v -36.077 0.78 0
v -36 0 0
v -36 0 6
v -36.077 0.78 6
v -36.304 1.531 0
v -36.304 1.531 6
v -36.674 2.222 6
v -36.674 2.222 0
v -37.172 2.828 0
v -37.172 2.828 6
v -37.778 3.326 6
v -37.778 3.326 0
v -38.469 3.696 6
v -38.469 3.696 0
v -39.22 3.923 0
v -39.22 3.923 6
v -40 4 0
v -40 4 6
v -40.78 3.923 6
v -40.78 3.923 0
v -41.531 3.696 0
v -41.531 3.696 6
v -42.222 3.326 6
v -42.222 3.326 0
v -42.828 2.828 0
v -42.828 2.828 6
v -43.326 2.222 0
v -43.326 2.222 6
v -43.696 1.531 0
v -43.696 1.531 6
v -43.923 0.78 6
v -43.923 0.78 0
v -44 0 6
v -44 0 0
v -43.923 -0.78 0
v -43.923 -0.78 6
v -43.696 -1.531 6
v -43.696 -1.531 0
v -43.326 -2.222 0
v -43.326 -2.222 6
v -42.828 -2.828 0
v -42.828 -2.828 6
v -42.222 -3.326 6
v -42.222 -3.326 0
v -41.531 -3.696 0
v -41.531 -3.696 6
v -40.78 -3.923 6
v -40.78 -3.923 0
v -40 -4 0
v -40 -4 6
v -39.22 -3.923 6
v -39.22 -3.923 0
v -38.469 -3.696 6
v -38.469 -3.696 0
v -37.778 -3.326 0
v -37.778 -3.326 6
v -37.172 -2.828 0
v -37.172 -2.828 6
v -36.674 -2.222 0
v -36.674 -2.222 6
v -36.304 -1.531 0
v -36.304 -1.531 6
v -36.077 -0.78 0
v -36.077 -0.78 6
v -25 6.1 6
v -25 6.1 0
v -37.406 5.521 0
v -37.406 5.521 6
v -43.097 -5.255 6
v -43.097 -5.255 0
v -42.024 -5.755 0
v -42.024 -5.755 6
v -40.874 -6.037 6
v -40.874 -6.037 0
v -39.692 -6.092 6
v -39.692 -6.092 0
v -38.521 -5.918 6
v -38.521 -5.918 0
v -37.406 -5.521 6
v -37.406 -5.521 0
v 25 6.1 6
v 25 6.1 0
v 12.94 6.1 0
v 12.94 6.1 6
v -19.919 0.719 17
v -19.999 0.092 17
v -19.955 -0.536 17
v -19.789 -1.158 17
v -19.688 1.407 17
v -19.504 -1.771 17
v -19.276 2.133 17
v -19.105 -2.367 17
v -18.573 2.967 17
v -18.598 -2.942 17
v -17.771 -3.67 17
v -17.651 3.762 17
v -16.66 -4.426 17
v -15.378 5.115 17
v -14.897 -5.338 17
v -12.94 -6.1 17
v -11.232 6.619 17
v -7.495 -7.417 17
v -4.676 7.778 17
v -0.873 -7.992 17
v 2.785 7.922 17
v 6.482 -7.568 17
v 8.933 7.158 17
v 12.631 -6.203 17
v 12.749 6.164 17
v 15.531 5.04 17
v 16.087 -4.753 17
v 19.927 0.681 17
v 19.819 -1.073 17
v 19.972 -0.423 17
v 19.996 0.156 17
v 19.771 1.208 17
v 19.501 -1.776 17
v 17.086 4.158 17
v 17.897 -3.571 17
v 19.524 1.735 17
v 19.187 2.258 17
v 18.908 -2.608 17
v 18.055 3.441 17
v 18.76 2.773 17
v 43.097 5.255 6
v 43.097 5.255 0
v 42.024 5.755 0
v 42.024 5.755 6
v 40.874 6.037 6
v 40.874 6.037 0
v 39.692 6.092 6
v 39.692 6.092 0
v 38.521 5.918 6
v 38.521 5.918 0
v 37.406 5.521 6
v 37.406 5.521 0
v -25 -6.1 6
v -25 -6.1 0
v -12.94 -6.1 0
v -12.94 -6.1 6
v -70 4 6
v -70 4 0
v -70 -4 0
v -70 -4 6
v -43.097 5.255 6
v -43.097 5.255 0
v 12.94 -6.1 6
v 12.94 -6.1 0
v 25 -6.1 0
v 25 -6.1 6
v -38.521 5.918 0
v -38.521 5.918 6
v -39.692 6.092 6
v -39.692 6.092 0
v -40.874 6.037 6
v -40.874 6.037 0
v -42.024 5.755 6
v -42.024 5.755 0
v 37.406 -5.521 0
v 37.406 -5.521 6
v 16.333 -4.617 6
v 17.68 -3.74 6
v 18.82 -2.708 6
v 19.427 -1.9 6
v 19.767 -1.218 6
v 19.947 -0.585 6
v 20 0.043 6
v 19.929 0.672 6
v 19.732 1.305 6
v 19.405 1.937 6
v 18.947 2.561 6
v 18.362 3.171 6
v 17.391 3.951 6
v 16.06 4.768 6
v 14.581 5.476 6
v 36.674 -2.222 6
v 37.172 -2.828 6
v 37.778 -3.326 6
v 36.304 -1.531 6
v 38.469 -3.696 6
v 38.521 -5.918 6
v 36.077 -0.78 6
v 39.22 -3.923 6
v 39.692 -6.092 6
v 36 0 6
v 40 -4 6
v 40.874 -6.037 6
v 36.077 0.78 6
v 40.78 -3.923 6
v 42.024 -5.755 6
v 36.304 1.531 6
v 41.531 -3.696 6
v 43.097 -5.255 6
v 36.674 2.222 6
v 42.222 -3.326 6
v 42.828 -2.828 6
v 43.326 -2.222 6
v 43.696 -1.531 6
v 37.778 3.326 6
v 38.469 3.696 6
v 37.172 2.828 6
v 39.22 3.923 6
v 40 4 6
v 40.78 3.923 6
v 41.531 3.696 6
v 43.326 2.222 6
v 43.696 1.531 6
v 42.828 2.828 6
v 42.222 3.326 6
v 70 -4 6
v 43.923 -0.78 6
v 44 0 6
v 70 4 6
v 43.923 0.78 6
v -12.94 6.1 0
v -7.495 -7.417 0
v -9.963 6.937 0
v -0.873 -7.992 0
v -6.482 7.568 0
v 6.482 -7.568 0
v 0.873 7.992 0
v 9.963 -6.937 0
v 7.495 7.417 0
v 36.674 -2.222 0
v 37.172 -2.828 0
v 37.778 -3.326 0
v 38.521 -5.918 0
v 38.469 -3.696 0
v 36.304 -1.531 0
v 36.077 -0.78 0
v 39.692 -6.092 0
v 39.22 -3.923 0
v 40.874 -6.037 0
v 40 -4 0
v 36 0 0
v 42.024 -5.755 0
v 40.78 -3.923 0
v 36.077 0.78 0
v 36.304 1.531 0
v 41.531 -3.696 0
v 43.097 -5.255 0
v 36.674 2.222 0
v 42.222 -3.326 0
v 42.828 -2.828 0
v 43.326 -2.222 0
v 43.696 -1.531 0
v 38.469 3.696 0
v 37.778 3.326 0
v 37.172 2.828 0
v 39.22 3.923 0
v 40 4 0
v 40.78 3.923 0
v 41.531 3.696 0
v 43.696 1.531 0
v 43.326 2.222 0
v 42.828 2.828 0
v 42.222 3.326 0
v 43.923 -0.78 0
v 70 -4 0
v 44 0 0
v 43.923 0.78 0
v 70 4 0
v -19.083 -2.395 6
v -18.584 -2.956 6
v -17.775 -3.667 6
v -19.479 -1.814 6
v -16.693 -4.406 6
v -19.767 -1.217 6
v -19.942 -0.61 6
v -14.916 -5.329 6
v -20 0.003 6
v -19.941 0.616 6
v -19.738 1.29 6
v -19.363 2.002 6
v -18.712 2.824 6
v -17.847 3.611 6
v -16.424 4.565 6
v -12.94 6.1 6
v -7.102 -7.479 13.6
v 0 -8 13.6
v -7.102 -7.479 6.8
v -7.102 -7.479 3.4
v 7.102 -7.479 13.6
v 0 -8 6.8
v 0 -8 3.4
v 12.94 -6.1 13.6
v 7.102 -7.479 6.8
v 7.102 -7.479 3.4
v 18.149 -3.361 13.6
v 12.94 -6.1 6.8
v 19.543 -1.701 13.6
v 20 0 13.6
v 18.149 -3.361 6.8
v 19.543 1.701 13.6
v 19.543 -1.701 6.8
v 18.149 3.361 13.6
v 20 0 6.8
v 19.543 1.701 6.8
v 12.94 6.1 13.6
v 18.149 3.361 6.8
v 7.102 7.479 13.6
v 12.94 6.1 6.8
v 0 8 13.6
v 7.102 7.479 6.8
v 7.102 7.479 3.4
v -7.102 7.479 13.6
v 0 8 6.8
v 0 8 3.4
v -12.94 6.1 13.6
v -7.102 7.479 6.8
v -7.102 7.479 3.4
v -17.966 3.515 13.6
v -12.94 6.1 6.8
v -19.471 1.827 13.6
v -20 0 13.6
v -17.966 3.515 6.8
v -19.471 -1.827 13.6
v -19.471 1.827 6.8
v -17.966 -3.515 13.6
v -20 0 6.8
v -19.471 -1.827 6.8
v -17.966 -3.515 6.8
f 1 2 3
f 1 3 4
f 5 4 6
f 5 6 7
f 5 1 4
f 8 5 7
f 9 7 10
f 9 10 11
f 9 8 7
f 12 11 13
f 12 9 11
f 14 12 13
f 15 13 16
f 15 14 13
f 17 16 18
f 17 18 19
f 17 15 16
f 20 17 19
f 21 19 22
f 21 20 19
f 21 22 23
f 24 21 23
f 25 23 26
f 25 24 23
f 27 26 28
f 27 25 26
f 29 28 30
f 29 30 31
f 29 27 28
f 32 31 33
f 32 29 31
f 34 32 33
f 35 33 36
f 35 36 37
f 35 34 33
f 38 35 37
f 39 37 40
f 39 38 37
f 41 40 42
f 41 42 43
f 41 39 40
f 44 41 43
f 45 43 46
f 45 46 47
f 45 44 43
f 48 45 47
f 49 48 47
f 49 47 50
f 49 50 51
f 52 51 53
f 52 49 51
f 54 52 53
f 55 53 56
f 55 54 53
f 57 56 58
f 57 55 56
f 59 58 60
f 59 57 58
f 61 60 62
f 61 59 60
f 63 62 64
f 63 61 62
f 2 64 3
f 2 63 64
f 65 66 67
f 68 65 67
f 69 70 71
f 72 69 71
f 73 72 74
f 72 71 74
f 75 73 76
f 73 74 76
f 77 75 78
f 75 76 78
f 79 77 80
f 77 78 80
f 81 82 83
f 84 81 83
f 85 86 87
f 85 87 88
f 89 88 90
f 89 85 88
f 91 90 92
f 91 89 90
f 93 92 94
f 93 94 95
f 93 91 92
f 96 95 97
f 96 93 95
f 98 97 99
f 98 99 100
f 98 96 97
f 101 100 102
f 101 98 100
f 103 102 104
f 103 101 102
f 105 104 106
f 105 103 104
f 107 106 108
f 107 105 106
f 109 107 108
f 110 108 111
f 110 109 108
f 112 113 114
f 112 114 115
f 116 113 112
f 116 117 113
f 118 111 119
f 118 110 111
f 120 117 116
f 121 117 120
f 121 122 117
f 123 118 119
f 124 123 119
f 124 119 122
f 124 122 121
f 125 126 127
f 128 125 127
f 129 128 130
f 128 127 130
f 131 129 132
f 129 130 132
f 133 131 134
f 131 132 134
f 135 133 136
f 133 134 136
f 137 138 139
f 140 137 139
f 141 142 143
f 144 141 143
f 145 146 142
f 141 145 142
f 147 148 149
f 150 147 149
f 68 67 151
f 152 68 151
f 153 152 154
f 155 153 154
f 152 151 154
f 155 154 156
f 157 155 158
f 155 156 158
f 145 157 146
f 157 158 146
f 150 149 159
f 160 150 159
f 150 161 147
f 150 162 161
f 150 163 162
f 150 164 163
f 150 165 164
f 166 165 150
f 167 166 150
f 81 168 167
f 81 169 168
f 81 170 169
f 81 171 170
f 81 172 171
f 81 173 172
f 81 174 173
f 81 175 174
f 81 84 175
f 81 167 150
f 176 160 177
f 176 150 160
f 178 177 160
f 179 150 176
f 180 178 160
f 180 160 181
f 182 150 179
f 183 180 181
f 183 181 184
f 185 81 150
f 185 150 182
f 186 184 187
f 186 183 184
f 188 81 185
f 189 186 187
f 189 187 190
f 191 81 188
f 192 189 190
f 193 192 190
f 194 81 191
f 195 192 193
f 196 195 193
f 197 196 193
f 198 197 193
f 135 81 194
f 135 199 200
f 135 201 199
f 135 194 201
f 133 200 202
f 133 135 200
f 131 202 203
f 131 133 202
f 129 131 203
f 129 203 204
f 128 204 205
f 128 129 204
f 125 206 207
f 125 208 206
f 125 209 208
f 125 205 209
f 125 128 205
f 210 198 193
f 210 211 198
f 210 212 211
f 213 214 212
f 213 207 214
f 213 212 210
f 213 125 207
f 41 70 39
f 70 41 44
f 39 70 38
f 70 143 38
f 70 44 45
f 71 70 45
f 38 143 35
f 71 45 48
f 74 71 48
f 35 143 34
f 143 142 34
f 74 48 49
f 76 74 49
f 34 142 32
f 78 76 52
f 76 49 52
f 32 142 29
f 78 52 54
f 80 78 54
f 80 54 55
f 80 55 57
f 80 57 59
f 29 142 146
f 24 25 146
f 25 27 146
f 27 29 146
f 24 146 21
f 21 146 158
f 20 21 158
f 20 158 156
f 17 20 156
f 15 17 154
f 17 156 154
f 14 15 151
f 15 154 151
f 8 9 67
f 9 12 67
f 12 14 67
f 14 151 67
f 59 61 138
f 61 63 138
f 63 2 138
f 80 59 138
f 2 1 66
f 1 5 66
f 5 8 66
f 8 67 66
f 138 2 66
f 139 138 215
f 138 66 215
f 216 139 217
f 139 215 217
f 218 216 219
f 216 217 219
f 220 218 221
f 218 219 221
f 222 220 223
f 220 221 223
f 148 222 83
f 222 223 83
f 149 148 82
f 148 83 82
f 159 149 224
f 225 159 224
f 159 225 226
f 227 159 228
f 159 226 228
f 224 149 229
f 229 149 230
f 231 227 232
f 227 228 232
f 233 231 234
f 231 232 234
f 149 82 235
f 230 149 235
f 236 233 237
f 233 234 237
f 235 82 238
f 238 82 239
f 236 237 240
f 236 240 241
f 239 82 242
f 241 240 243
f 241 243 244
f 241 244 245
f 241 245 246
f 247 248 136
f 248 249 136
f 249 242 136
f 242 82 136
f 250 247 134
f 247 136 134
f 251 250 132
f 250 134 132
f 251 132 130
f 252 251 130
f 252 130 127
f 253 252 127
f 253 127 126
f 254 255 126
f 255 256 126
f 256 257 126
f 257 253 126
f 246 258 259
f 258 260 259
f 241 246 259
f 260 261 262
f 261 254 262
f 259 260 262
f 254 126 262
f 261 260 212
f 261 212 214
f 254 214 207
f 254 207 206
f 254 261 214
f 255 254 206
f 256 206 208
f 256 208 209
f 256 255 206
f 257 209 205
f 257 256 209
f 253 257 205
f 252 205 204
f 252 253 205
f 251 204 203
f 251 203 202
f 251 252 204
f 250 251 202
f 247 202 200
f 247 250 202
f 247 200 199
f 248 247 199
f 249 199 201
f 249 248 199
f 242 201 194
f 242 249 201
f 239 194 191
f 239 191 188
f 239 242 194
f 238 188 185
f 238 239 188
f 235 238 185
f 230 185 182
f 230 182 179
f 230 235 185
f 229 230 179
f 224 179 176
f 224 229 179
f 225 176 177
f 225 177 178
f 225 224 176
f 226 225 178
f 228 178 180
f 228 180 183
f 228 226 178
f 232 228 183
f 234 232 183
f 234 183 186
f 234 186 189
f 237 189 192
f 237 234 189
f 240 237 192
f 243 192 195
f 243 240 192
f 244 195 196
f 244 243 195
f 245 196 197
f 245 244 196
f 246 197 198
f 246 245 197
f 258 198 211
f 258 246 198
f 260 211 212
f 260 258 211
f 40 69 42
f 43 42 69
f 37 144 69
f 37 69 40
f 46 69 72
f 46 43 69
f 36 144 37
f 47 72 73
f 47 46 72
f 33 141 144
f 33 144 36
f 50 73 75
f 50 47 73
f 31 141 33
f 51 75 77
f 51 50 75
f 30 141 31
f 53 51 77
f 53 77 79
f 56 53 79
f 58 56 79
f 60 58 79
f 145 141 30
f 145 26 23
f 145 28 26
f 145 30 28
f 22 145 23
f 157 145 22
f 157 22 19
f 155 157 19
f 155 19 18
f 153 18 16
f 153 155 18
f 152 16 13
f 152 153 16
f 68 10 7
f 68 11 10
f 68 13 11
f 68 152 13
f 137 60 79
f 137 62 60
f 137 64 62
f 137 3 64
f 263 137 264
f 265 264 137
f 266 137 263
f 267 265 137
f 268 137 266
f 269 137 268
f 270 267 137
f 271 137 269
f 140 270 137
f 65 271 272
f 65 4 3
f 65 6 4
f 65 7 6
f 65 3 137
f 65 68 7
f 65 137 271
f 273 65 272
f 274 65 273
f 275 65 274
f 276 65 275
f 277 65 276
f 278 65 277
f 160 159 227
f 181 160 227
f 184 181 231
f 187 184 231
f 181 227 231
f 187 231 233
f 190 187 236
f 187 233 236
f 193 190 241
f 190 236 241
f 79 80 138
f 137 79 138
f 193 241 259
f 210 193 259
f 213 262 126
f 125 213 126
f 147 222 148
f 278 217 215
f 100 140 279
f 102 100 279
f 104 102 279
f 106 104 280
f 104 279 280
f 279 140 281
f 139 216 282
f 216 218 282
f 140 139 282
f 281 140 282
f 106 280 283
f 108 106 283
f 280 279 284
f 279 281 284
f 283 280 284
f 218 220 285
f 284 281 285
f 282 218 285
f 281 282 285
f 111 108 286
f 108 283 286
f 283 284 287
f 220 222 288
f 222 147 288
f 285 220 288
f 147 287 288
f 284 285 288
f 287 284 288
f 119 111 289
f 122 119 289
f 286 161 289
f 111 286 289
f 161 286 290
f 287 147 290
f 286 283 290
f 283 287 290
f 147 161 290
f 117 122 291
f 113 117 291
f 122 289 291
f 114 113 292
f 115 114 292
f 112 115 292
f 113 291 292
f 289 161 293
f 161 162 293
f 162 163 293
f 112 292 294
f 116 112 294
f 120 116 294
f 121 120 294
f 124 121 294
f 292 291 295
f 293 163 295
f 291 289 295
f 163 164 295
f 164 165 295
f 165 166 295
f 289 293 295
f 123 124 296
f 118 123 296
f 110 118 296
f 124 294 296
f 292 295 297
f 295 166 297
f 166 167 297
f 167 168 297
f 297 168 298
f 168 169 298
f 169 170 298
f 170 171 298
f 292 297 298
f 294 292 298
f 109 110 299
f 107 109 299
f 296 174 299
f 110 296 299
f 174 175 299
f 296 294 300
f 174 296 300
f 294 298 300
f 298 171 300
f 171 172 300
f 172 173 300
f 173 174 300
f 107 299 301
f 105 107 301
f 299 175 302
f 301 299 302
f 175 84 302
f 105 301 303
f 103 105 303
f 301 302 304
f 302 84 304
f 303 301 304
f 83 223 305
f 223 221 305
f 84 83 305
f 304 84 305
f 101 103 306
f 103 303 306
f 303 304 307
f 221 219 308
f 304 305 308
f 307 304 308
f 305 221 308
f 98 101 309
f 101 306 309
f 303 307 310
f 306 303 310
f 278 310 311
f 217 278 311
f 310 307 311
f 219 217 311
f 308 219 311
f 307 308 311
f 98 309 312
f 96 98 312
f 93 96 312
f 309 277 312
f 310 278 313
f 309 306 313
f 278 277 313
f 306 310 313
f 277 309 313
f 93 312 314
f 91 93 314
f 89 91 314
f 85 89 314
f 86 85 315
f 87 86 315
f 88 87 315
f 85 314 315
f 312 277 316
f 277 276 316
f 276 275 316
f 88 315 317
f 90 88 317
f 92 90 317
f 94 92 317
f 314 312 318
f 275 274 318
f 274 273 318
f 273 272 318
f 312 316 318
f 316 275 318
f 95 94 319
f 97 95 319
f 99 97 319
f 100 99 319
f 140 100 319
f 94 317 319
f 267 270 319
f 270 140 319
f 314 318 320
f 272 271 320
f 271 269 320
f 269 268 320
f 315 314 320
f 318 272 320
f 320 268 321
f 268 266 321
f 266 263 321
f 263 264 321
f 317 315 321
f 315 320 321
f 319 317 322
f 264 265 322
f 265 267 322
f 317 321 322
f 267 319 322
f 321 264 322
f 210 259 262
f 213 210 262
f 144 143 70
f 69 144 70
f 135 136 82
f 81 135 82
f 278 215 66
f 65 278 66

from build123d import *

# Parameters (mm, degrees)
F0_R     = 4
F1_DEPTH = 6
F2_DEPTH = 17


with BuildPart() as f1:
    # F0 (on Top) → F1 (new body)
    with BuildSketch(Plane.XY):
        with BuildLine():
            ThreePointArc((-43.096752955, -5.2554848621), (-46.1, 0), (-43.096752955, 5.2554848621))
            Line((-43.096752955, 5.2554848621), (-70, 4))
            Line((-70, 4), (-70, 0))
            Line((-70, 0), (-70, -4))
            Line((-70, -4), (-43.096752955, -5.2554848621))
        make_face()
        with BuildLine():
            Line((-43.096752955, 5.2554848621), (-37.4061518301, 5.5210462479))
            ThreePointArc((-37.4061518301, 5.5210462479), (-40.2843572017, 6.0933686071), (-43.096752955, 5.2554848621))
        make_face()
        with BuildLine():
            ThreePointArc((-43.096752955, -5.2554848621), (-40.2843572017, -6.0933686071), (-37.4061518301, -5.5210462479))
            Line((-37.4061518301, -5.5210462479), (-43.096752955, -5.2554848621))
        make_face()
        with BuildLine():
            add(Edge.make_bspline(
                [(-12.9397642946, 6.1), (-30.9124641603, 0), (-12.9397642946, -6.1)],
                knots=[2.2744242295, 2.2744242295, 2.2744242295, 4.0087610776, 4.0087610776, 4.0087610776], degree=2, weights=[1, 0.6469882147, 1]))
            Line((-12.9397642946, 6.1), (-25, 6.1))
            Line((-25, 6.1), (-37.4061518301, 5.5210462479))
            ThreePointArc((-37.4061518301, 5.5210462479), (-34.8506081021, 3.2701319671), (-33.9, 0))
            ThreePointArc((-33.9, 0), (-34.8506081021, -3.2701319671), (-37.4061518301, -5.5210462479))
            Line((-37.4061518301, -5.5210462479), (-25, -6.1))
            Line((-25, -6.1), (-12.9397642946, -6.1))
        make_face()
        with BuildLine():
            ThreePointArc((-33.9, 0), (-34.8506081021, 3.2701319671), (-37.4061518301, 5.5210462479))
            Line((-37.4061518301, 5.5210462479), (-43.096752955, 5.2554848621))
            ThreePointArc((-43.096752955, 5.2554848621), (-46.1, 0), (-43.096752955, -5.2554848621))
            Line((-43.096752955, -5.2554848621), (-37.4061518301, -5.5210462479))
            ThreePointArc((-37.4061518301, -5.5210462479), (-34.8506081021, -3.2701319671), (-33.9, 0))
        make_face()
        with Locations((-40, 0)):
            Circle(F0_R, mode=Mode.SUBTRACT)
    extrude(amount=F1_DEPTH)



with BuildPart() as f1b:
    # F0 (on Top) → F1, piece 2 (new body)
    with BuildSketch(Plane.XY):
        with BuildLine():
            Line((70, 4), (43.096752955, 5.2554848621))
            ThreePointArc((43.096752955, 5.2554848621), (45.2962341822, 3.0265332457), (46.1, 0))
            ThreePointArc((46.1, 0), (45.2962341822, -3.0265332457), (43.096752955, -5.2554848621))
            Line((43.096752955, -5.2554848621), (70, -4))
            Line((70, -4), (70, 0))
            Line((70, 0), (70, 4))
        make_face()
        with BuildLine():
            Line((43.096752955, -5.2554848621), (37.4061518301, -5.5210462479))
            ThreePointArc((37.4061518301, -5.5210462479), (40.2843572017, -6.0933686071), (43.096752955, -5.2554848621))
        make_face()
        with BuildLine():
            ThreePointArc((43.096752955, 5.2554848621), (40.2843572017, 6.0933686071), (37.4061518301, 5.5210462479))
            Line((37.4061518301, 5.5210462479), (43.096752955, 5.2554848621))
        make_face()
        with BuildLine():
            add(Edge.make_bspline(
                [(20, 0), (20, 3.7037302061), (12.9397642946, 6.1)],
                knots=[0, 0, 0, 0.8671684241, 0.8671684241, 0.8671684241], degree=2, weights=[1, 0.907465761, 1]))
            add(Edge.make_bspline(
                [(12.9397642946, -6.1), (20, -3.7037302061), (20, 0)],
                knots=[5.4160168831, 5.4160168831, 5.4160168831, 6.2831853072, 6.2831853072, 6.2831853072], degree=2, weights=[1, 0.907465761, 1]))
            Line((12.9397642946, -6.1), (25, -6.1))
            Line((25, -6.1), (37.4061518301, -5.5210462479))
            ThreePointArc((37.4061518301, -5.5210462479), (33.9, 0), (37.4061518301, 5.5210462479))
            Line((37.4061518301, 5.5210462479), (25, 6.1))
            Line((25, 6.1), (12.9397642946, 6.1))
        make_face()
        with BuildLine():
            Line((43.096752955, 5.2554848621), (37.4061518301, 5.5210462479))
            ThreePointArc((37.4061518301, 5.5210462479), (33.9, 0), (37.4061518301, -5.5210462479))
            Line((37.4061518301, -5.5210462479), (43.096752955, -5.2554848621))
            ThreePointArc((43.096752955, -5.2554848621), (45.2962341822, -3.0265332457), (46.1, 0))
            ThreePointArc((46.1, 0), (45.2962341822, 3.0265332457), (43.096752955, 5.2554848621))
        make_face()
        with Locations((40, 0)):
            Circle(F0_R, mode=Mode.SUBTRACT)
    extrude(amount=F1_DEPTH)


with BuildPart() as f1_1:
    add(f1.part)

    add(f1b.part)  # F2 merges F1b
    # F0 (on Top) → F2 (join)
    with BuildSketch(Plane.XY):
        with BuildLine():
            add(Edge.make_bspline(
                [(12.9397642946, -6.1), (20, -3.7037302061), (20, 0)],
                knots=[5.4160168831, 5.4160168831, 5.4160168831, 6.2831853072, 6.2831853072, 6.2831853072], degree=2, weights=[1, 0.907465761, 1]))
            add(Edge.make_bspline(
                [(20, 0), (20, 3.7037302061), (12.9397642946, 6.1)],
                knots=[0, 0, 0, 0.8671684241, 0.8671684241, 0.8671684241], degree=2, weights=[1, 0.907465761, 1]))
            add(Edge.make_bspline(
                [(12.9397642946, 6.1), (0, 10.4918032787), (-12.9397642946, 6.1)],
                knots=[0.8671684241, 0.8671684241, 0.8671684241, 2.2744242295, 2.2744242295, 2.2744242295], degree=2, weights=[1, 0.7625, 1]))
            add(Edge.make_bspline(
                [(-12.9397642946, 6.1), (-30.9124641603, 0), (-12.9397642946, -6.1)],
                knots=[2.2744242295, 2.2744242295, 2.2744242295, 4.0087610776, 4.0087610776, 4.0087610776], degree=2, weights=[1, 0.6469882147, 1]))
            add(Edge.make_bspline(
                [(-12.9397642946, -6.1), (0, -10.4918032787), (12.9397642946, -6.1)],
                knots=[4.0087610776, 4.0087610776, 4.0087610776, 5.4160168831, 5.4160168831, 5.4160168831], degree=2, weights=[1, 0.7625, 1]))
        make_face()
    extrude(amount=F2_DEPTH)


solid = f1_1.part
